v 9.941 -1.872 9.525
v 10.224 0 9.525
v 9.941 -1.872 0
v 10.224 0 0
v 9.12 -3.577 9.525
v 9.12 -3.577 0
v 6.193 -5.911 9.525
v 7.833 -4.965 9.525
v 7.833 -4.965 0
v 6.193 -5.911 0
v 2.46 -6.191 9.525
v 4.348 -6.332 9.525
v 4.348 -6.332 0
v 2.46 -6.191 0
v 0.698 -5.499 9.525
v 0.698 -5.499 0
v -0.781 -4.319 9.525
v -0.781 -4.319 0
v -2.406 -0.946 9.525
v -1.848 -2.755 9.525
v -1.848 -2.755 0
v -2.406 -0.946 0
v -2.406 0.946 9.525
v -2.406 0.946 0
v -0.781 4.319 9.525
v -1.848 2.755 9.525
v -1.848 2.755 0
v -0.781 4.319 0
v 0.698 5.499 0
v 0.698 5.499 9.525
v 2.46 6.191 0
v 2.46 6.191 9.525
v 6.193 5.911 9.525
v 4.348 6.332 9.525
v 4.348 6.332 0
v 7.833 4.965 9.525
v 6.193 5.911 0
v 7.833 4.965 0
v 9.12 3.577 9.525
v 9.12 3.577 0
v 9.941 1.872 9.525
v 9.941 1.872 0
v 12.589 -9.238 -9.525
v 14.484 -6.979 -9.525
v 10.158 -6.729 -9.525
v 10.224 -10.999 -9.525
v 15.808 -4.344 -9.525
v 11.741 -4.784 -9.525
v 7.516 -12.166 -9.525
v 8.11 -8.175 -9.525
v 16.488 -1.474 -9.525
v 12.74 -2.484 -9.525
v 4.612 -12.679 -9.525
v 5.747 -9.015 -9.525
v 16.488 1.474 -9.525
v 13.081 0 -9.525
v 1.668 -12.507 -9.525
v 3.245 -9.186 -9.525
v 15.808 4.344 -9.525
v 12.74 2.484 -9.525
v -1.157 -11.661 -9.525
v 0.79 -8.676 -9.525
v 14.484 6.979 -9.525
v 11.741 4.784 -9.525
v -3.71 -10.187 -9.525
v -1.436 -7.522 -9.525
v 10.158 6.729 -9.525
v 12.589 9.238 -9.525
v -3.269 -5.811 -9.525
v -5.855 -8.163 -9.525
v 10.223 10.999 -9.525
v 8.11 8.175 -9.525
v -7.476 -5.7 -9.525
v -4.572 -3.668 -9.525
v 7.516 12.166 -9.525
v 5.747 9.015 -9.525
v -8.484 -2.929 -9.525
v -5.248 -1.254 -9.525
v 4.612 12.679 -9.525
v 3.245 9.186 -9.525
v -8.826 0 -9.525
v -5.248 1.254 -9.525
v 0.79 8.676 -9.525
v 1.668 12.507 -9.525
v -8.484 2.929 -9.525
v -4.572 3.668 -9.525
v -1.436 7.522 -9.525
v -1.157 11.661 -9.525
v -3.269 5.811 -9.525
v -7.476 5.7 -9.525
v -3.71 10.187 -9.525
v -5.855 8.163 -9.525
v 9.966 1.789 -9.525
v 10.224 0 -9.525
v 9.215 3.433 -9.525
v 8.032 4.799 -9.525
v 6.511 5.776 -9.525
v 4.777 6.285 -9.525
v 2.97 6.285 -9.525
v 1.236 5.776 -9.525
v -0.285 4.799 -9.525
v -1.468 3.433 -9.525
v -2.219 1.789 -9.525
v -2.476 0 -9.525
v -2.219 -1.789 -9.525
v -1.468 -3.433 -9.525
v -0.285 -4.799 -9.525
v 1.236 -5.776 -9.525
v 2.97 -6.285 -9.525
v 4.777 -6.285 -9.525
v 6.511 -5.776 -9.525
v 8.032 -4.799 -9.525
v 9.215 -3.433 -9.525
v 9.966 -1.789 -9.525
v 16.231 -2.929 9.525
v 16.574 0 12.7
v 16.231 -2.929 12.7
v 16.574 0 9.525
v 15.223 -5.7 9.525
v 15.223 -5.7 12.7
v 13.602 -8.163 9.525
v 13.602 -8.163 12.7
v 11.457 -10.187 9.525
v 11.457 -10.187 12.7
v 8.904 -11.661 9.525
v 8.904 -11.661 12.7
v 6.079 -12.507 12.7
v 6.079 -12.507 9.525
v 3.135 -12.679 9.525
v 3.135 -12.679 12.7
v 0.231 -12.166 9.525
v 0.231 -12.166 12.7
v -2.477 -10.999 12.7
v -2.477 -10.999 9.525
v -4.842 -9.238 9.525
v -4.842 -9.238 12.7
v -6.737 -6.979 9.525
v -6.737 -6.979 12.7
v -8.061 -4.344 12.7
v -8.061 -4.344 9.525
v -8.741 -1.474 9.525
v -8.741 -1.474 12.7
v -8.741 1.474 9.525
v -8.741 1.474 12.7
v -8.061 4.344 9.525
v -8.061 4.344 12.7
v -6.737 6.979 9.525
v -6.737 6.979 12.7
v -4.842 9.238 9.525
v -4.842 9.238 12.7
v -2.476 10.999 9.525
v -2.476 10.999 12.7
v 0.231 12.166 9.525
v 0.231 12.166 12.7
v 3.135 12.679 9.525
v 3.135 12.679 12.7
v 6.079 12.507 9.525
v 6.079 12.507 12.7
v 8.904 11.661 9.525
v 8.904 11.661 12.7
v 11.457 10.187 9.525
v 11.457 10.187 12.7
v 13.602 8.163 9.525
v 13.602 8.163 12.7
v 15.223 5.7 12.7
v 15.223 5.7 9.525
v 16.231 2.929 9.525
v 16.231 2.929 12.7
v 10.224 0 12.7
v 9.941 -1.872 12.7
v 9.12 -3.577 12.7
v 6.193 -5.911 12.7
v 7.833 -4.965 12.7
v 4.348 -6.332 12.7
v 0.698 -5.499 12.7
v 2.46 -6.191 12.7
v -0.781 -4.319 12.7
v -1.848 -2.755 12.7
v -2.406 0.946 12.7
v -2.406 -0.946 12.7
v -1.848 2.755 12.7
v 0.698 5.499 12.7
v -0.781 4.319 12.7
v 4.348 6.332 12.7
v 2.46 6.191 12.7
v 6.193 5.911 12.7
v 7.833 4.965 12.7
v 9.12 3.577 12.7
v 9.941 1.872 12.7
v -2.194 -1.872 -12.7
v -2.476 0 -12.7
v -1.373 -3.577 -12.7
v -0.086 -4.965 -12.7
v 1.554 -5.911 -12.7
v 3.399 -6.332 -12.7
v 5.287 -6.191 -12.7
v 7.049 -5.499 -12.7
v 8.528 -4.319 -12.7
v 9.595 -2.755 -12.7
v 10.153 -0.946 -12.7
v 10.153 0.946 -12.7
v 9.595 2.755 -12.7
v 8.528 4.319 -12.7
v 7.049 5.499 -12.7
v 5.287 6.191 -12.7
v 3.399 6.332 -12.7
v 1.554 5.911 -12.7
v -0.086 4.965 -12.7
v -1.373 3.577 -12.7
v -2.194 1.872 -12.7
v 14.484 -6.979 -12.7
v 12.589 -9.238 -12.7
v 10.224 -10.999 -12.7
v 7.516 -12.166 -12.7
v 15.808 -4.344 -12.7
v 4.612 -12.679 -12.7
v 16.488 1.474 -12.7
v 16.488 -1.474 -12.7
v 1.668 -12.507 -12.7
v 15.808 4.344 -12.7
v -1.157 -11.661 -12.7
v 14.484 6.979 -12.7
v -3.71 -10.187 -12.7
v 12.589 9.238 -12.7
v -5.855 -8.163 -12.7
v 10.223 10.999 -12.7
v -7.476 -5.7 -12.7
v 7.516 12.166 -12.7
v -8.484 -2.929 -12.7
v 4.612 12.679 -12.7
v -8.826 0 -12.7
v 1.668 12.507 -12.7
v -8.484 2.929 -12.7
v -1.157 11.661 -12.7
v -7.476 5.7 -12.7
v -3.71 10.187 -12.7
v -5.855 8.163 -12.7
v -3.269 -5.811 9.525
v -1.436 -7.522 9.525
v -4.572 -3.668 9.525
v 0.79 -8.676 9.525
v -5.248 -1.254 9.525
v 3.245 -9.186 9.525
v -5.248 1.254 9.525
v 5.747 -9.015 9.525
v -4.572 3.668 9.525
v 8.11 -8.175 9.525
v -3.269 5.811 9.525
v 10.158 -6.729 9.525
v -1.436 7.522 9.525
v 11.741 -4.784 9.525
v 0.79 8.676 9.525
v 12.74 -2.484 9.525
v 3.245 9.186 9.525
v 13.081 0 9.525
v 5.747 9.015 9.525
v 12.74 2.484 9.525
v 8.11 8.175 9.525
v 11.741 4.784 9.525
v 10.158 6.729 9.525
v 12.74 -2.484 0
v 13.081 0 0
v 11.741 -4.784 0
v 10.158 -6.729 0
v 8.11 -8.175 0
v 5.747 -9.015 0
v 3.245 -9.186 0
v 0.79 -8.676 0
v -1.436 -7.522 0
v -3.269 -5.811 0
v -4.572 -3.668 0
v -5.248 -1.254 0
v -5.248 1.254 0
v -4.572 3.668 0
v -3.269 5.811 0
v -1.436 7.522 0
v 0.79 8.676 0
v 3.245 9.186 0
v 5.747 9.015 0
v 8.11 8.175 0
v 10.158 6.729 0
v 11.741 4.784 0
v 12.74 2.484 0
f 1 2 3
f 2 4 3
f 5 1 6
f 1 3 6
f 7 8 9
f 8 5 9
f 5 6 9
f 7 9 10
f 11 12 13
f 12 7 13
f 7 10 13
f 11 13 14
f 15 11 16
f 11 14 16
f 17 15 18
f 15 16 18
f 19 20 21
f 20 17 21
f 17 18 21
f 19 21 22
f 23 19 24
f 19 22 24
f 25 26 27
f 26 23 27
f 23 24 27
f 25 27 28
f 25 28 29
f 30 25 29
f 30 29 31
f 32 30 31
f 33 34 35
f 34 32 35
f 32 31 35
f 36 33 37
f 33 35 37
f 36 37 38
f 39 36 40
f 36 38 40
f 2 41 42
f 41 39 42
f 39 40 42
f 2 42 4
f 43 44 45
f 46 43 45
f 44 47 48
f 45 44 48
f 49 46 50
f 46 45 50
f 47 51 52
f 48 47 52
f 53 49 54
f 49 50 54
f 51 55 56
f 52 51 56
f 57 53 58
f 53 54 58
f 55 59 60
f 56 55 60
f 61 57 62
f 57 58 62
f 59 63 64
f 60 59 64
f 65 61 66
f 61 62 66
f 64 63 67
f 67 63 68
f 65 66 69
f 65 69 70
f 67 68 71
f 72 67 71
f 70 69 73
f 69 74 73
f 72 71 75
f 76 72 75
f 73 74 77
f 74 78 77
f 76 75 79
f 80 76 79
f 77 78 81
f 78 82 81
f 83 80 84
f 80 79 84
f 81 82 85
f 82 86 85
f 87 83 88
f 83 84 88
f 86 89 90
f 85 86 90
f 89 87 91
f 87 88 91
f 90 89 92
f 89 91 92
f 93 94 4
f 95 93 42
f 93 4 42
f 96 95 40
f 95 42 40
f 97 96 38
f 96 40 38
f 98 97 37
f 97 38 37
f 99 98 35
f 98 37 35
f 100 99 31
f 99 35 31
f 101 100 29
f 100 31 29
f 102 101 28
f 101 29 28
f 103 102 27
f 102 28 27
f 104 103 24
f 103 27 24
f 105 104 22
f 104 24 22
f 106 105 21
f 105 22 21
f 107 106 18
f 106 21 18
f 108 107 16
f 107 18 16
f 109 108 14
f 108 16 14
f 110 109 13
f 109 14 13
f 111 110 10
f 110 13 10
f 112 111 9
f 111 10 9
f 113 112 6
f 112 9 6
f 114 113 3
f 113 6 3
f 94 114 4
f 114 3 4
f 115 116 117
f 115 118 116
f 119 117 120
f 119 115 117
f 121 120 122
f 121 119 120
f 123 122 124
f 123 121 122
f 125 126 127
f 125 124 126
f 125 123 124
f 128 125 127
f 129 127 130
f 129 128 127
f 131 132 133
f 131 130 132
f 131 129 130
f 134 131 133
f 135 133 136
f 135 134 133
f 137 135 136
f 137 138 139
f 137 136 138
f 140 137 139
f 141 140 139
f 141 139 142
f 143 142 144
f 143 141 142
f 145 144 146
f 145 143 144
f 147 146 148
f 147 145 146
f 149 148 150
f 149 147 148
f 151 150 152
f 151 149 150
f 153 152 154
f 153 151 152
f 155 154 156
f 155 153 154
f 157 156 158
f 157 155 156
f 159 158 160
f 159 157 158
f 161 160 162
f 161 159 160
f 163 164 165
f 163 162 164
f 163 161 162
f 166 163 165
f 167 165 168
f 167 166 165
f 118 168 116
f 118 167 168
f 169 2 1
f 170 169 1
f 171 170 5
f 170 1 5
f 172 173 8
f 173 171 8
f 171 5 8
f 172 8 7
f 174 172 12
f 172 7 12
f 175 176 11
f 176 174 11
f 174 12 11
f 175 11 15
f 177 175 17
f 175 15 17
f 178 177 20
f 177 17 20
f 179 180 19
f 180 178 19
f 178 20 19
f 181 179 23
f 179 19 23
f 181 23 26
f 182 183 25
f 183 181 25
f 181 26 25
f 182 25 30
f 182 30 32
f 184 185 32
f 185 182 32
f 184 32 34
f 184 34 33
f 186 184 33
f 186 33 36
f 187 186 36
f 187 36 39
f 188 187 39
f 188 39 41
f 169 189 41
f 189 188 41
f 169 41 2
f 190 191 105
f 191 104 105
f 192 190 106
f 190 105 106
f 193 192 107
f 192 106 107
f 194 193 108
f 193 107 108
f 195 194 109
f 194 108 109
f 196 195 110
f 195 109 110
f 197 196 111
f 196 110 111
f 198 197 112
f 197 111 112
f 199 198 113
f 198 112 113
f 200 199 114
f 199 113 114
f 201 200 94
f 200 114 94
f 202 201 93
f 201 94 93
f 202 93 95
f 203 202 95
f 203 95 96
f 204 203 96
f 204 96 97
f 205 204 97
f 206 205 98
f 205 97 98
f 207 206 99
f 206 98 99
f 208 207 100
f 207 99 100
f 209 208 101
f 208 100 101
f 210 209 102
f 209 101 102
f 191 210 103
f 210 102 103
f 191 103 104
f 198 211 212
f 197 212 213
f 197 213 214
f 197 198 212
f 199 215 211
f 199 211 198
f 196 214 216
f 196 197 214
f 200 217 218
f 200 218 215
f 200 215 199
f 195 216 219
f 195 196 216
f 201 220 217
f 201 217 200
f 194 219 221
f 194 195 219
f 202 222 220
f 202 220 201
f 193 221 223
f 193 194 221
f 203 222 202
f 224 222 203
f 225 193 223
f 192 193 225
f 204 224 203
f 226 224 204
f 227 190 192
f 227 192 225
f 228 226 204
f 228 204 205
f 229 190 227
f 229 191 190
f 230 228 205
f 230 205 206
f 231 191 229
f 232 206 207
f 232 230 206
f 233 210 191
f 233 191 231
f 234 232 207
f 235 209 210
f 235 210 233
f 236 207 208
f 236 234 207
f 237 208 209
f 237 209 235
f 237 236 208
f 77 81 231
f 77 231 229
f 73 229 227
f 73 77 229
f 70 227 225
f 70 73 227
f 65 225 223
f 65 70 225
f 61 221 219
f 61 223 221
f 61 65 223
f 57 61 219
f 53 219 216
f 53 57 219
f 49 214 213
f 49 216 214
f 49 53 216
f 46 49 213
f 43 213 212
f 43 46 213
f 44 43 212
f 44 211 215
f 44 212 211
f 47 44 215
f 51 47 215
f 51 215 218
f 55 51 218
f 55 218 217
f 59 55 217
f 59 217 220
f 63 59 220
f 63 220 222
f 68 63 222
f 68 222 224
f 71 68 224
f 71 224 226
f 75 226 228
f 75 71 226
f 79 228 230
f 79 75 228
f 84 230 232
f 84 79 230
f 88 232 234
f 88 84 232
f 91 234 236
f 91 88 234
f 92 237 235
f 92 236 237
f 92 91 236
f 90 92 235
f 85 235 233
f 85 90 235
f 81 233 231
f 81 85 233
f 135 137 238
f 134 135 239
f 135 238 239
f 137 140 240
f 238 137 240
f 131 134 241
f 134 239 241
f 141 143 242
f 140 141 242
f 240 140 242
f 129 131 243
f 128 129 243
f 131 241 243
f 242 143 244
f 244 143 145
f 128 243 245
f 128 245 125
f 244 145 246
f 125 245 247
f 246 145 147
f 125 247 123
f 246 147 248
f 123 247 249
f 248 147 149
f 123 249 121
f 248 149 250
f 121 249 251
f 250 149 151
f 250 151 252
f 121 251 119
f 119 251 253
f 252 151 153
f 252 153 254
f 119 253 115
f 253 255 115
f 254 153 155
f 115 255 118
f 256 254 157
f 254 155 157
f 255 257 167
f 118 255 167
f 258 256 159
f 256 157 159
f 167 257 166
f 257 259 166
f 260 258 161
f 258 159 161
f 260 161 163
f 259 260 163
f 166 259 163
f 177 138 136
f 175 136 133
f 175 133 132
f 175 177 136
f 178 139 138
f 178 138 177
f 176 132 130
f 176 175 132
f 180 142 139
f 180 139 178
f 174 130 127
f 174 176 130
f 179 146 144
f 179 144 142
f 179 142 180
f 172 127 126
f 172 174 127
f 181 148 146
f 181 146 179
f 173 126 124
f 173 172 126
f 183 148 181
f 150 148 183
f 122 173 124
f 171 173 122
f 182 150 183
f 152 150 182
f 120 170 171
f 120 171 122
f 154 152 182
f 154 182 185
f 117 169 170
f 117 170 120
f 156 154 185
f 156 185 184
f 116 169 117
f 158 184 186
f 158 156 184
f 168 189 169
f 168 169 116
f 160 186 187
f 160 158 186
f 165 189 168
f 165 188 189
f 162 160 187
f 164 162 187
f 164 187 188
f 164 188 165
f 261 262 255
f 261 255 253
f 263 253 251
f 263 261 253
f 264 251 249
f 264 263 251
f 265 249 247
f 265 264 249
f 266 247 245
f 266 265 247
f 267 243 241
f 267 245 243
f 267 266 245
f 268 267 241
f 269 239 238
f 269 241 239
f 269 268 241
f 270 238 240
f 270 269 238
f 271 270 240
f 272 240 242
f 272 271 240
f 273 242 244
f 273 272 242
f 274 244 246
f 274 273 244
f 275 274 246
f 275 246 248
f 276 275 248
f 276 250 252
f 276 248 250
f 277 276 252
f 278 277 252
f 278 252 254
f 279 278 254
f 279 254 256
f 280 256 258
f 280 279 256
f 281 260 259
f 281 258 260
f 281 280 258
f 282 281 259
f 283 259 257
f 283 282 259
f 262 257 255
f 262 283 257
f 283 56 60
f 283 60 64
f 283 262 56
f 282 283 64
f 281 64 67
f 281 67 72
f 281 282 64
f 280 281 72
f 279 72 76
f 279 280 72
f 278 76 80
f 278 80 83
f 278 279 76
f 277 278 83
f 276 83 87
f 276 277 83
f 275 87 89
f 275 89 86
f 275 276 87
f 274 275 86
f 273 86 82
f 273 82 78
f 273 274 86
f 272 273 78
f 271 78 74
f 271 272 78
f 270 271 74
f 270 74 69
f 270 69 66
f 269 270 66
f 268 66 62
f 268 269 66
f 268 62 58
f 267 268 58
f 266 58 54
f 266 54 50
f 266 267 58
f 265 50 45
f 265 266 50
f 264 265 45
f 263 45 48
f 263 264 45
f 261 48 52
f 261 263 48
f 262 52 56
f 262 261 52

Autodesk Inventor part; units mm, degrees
ref_plane "YZ Plane" through (0, 0, 0) normal (1, 0, 0) x (0, 1, 0)
ref_plane "XZ Plane" through (0, 0, 0) normal (0, 1, 0) x (-1, 0, 0)
ref_plane "XY Plane" through (0, 0, 0) normal (0, 0, 1) x (1, 0, 0)
sketch "Sketch1" plane through (0, 0, 0) normal (0, 0, 1) x (1, 0, 0)
  line L0 (-12.7, 76.2) -> (12.7, 76.2) construction
  line L1 (12.7, 76.2) -> (12.7, -76.2) construction
  line L2 (12.7, -76.2) -> (-12.7, -76.2) construction
  line L3 (-12.7, -76.2) -> (-12.7, 76.2) construction
  line L4 (-12.7, 76.2) -> (12.7, -76.2) construction
  line L5 (12.7, 76.2) -> (-12.7, -76.2) construction
  line L6 (19.05, 76.2) -> (44.45, 76.2) construction
  line L7 (44.45, 76.2) -> (44.45, -76.2) construction
  line L8 (44.45, -76.2) -> (19.05, -76.2) construction
  line L9 (19.05, -76.2) -> (19.05, 76.2) construction
  line L10 (19.05, 76.2) -> (44.45, -76.2) construction
  line L11 (44.45, 76.2) -> (19.05, -76.2) construction
  circle A0 centre (3.8735, 0) radius 6.35
  line L12 (11.1125, -57.0186) -> (11.1125, 57.0186) construction
  line L13 (11.1125, 57.0186) -> (-14.2875, -95.3814) construction
  line L14 (-14.2875, -95.3814) -> (-14.2875, 95.3814) construction
  line L15 (-14.2875, 95.3814) -> (11.1125, -57.0186) construction
  line L16 (13.081, 27.2802) -> (13.081, -0.0011) construction
  circle A1 centre (3.8735, 0) radius 9.2075
  point P0 (0, 0)
  point P1 (31.75, 0)
  point P2 (0, 0)
  point P3 (0, 76.2)
  point P4 (31.75, 76.2)
  point P5 (0, 0)
  dimension "d1" = 25.4
  dimension "d2" = 152.4
  dimension "d3" = 25.4
  dimension "d4" = 152.4
  dimension "d5" = 6.35
  dimension "d6" = 12.7
  dimension "d7" = 1.5875
  dimension "d8" = 0.381
  dimension "d11" = 18.415
  dimension "d21" = 8.8265
extrude "Extrusion1" add sketch "Sketch1" along normal mid plane 19.05
sketch "Sketch2" plane through (3.8735, 0, 9.525) normal (0, 0, 1) x (1, 0, 0)
  circle A0 centre (0, 0) radius 9.2075 projected
  circle A1 centre (0, 0) radius 12.7
  circle A2 centre (0, 0) radius 6.35 projected
  point P0 (-3.8735, 0)
  dimension "d23" = 25.4
extrude "Extrusion2" add sketch "Sketch2" along normal blind 3.175 contours A0 | A1
sketch "Sketch3" plane through (3.8735, 0, -9.525) normal (0, 0, -1) x (-1, 0, 0)
  circle A0 centre (0, 0) radius 9.2075 projected
  circle A1 centre (0, 0) radius 12.7
  circle A2 centre (0, 0) radius 6.35 projected
  point P0 (3.8735, 0)
  dimension "d22" = 25.4
extrude "Extrusion3" add sketch "Sketch3" along normal blind 3.175 contours A0 | A1
properties part number "EL2-007" material "Aluminum 6061"
